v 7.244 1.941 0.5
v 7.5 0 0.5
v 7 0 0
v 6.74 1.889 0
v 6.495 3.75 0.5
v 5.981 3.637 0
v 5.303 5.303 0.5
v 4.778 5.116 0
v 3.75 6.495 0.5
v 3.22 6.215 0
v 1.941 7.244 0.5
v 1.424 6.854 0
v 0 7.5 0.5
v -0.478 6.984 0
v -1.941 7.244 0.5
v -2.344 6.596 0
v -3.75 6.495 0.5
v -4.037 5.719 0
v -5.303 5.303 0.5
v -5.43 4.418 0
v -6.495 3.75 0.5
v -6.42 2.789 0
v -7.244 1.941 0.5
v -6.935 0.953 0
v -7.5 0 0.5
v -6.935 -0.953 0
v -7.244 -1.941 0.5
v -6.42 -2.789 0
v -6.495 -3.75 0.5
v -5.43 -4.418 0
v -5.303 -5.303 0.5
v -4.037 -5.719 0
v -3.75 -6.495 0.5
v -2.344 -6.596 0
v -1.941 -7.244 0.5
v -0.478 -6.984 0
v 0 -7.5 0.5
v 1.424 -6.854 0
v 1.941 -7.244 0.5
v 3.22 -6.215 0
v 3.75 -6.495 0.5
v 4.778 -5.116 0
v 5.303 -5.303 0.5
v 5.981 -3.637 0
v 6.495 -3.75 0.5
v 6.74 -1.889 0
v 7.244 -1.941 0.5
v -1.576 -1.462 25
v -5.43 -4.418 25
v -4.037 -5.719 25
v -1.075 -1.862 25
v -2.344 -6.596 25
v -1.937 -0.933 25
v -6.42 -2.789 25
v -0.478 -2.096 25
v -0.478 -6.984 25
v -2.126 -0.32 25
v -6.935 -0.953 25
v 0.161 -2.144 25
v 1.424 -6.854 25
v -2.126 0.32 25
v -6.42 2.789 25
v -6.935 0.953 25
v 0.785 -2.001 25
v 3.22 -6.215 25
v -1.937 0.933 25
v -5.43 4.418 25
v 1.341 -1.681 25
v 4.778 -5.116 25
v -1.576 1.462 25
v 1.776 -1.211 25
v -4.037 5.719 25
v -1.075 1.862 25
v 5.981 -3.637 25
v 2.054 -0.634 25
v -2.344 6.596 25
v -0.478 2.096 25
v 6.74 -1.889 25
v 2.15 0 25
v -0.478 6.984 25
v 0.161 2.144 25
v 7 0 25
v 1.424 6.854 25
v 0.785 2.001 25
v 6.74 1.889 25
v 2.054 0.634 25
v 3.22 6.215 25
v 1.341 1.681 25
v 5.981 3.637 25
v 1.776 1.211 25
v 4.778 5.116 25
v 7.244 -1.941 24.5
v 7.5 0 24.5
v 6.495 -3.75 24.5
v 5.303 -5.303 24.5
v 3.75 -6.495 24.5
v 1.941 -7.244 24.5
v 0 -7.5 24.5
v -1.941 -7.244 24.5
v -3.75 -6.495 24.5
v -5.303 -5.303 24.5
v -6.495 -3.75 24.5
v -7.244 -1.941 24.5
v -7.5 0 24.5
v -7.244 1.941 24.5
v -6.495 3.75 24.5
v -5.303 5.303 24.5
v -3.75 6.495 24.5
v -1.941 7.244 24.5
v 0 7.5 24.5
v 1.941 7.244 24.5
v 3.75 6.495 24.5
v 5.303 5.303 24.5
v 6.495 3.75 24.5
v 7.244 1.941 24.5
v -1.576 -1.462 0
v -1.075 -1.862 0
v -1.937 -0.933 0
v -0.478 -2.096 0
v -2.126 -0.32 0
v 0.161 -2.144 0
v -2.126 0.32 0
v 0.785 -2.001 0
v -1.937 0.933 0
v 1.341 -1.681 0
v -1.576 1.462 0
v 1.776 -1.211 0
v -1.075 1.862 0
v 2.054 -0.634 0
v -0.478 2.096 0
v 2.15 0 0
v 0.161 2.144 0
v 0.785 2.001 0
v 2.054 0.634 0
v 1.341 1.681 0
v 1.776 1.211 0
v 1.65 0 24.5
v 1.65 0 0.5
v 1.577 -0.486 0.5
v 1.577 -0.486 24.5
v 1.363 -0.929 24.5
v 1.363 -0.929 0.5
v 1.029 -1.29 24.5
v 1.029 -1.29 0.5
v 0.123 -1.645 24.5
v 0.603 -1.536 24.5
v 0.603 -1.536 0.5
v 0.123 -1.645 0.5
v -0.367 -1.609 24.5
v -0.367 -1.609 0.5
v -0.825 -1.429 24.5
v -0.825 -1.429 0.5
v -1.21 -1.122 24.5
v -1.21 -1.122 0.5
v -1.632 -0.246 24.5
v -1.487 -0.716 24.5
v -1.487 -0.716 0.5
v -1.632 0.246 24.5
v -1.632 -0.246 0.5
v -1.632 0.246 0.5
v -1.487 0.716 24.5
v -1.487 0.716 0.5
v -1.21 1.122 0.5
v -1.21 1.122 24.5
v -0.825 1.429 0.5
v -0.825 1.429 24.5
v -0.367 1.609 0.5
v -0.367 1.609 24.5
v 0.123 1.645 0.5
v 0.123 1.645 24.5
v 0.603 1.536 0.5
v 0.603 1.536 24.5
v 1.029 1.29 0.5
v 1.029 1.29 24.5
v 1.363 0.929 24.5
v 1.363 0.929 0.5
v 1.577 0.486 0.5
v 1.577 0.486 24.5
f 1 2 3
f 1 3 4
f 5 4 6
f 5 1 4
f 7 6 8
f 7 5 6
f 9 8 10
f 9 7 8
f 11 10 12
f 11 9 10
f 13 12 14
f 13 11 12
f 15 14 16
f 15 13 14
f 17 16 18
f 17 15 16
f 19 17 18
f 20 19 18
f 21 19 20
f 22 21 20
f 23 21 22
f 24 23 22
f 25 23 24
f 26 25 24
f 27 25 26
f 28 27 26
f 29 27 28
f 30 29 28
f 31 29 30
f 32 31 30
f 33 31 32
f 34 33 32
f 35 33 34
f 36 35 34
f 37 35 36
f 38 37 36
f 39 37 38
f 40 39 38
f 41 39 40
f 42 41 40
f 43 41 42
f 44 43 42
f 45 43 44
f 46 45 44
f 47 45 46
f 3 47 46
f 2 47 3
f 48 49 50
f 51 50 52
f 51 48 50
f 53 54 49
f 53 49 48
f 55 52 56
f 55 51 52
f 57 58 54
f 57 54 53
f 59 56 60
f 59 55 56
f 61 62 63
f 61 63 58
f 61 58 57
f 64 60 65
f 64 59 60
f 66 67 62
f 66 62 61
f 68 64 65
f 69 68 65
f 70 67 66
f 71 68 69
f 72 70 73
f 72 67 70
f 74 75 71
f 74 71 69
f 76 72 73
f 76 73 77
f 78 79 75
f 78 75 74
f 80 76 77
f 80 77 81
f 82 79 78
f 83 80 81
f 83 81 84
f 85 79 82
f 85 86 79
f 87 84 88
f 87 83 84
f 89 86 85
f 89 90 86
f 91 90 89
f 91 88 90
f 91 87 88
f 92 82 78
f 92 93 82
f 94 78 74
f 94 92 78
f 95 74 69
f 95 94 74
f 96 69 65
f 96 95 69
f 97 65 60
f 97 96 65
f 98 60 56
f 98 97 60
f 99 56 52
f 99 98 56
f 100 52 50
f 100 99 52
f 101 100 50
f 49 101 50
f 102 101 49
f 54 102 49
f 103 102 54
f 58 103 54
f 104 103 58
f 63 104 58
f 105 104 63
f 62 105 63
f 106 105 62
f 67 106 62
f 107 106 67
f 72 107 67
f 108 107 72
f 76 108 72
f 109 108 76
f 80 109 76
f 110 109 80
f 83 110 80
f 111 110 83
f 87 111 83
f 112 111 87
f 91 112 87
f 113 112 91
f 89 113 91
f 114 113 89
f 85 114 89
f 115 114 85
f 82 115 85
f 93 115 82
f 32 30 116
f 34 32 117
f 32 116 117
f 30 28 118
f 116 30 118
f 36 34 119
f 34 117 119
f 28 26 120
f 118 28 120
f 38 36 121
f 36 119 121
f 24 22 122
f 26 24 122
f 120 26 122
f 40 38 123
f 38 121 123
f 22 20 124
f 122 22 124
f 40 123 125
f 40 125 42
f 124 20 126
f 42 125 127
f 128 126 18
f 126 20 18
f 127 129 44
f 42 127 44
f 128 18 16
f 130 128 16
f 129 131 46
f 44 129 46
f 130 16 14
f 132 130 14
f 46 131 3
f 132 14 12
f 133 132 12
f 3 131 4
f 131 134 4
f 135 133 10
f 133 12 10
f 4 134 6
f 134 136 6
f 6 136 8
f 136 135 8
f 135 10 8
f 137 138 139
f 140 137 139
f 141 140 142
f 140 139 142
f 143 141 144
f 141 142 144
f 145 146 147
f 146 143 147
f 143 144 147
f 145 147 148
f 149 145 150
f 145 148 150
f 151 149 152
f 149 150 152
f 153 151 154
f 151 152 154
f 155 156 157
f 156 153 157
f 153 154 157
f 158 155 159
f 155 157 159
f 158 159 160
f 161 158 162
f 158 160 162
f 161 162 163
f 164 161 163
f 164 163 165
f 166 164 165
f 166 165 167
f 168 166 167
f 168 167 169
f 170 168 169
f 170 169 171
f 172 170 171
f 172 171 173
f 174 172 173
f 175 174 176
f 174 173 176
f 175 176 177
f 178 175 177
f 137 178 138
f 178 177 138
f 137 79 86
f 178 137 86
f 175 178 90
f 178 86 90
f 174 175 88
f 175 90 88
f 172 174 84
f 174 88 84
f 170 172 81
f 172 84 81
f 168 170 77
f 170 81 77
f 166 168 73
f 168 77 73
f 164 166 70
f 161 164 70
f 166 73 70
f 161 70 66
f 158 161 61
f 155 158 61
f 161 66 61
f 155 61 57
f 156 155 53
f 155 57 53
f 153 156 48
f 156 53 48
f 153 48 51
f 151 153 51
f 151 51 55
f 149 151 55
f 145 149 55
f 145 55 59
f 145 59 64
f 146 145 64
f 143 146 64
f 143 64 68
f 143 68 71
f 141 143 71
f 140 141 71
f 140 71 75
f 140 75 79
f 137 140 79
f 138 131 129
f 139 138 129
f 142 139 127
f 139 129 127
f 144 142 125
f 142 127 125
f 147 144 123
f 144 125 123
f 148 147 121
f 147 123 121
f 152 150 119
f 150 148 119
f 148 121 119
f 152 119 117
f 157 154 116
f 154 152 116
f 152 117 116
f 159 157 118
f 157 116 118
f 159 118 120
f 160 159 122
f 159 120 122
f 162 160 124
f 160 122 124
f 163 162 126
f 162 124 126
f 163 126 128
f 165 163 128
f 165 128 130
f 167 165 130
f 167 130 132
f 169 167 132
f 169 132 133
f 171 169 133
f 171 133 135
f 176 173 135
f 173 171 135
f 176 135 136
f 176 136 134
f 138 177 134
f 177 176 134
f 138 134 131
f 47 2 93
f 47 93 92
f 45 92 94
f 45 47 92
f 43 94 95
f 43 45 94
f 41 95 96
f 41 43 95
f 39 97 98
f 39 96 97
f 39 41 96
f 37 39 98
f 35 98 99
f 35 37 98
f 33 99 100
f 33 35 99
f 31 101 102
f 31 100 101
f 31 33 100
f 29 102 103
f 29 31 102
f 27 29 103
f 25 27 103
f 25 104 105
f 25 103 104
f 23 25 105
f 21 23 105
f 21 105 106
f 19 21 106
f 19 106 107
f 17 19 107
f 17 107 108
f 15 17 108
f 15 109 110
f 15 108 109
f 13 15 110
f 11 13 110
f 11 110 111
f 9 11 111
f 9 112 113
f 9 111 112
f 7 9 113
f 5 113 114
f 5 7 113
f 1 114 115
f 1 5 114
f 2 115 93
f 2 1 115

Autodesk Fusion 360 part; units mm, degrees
sketch "Sketch1" plane through (0, 0, 0) normal (0, 0, 1) x (1, 0, 0)
  circle A0 centre (0, 0) radius 1.65
  circle A1 centre (0, 0) radius 7.5
  dimension "d1" = 3.3
  dimension "d2" = 15
extrude "Extrude1" add sketch "Sketch1" along normal blind 25
chamfer "Chamfer1" distance 0.5 angle 45 2 faces at (5.5159, -0.4546, 25) (5.5159, -0.4546, 0)
